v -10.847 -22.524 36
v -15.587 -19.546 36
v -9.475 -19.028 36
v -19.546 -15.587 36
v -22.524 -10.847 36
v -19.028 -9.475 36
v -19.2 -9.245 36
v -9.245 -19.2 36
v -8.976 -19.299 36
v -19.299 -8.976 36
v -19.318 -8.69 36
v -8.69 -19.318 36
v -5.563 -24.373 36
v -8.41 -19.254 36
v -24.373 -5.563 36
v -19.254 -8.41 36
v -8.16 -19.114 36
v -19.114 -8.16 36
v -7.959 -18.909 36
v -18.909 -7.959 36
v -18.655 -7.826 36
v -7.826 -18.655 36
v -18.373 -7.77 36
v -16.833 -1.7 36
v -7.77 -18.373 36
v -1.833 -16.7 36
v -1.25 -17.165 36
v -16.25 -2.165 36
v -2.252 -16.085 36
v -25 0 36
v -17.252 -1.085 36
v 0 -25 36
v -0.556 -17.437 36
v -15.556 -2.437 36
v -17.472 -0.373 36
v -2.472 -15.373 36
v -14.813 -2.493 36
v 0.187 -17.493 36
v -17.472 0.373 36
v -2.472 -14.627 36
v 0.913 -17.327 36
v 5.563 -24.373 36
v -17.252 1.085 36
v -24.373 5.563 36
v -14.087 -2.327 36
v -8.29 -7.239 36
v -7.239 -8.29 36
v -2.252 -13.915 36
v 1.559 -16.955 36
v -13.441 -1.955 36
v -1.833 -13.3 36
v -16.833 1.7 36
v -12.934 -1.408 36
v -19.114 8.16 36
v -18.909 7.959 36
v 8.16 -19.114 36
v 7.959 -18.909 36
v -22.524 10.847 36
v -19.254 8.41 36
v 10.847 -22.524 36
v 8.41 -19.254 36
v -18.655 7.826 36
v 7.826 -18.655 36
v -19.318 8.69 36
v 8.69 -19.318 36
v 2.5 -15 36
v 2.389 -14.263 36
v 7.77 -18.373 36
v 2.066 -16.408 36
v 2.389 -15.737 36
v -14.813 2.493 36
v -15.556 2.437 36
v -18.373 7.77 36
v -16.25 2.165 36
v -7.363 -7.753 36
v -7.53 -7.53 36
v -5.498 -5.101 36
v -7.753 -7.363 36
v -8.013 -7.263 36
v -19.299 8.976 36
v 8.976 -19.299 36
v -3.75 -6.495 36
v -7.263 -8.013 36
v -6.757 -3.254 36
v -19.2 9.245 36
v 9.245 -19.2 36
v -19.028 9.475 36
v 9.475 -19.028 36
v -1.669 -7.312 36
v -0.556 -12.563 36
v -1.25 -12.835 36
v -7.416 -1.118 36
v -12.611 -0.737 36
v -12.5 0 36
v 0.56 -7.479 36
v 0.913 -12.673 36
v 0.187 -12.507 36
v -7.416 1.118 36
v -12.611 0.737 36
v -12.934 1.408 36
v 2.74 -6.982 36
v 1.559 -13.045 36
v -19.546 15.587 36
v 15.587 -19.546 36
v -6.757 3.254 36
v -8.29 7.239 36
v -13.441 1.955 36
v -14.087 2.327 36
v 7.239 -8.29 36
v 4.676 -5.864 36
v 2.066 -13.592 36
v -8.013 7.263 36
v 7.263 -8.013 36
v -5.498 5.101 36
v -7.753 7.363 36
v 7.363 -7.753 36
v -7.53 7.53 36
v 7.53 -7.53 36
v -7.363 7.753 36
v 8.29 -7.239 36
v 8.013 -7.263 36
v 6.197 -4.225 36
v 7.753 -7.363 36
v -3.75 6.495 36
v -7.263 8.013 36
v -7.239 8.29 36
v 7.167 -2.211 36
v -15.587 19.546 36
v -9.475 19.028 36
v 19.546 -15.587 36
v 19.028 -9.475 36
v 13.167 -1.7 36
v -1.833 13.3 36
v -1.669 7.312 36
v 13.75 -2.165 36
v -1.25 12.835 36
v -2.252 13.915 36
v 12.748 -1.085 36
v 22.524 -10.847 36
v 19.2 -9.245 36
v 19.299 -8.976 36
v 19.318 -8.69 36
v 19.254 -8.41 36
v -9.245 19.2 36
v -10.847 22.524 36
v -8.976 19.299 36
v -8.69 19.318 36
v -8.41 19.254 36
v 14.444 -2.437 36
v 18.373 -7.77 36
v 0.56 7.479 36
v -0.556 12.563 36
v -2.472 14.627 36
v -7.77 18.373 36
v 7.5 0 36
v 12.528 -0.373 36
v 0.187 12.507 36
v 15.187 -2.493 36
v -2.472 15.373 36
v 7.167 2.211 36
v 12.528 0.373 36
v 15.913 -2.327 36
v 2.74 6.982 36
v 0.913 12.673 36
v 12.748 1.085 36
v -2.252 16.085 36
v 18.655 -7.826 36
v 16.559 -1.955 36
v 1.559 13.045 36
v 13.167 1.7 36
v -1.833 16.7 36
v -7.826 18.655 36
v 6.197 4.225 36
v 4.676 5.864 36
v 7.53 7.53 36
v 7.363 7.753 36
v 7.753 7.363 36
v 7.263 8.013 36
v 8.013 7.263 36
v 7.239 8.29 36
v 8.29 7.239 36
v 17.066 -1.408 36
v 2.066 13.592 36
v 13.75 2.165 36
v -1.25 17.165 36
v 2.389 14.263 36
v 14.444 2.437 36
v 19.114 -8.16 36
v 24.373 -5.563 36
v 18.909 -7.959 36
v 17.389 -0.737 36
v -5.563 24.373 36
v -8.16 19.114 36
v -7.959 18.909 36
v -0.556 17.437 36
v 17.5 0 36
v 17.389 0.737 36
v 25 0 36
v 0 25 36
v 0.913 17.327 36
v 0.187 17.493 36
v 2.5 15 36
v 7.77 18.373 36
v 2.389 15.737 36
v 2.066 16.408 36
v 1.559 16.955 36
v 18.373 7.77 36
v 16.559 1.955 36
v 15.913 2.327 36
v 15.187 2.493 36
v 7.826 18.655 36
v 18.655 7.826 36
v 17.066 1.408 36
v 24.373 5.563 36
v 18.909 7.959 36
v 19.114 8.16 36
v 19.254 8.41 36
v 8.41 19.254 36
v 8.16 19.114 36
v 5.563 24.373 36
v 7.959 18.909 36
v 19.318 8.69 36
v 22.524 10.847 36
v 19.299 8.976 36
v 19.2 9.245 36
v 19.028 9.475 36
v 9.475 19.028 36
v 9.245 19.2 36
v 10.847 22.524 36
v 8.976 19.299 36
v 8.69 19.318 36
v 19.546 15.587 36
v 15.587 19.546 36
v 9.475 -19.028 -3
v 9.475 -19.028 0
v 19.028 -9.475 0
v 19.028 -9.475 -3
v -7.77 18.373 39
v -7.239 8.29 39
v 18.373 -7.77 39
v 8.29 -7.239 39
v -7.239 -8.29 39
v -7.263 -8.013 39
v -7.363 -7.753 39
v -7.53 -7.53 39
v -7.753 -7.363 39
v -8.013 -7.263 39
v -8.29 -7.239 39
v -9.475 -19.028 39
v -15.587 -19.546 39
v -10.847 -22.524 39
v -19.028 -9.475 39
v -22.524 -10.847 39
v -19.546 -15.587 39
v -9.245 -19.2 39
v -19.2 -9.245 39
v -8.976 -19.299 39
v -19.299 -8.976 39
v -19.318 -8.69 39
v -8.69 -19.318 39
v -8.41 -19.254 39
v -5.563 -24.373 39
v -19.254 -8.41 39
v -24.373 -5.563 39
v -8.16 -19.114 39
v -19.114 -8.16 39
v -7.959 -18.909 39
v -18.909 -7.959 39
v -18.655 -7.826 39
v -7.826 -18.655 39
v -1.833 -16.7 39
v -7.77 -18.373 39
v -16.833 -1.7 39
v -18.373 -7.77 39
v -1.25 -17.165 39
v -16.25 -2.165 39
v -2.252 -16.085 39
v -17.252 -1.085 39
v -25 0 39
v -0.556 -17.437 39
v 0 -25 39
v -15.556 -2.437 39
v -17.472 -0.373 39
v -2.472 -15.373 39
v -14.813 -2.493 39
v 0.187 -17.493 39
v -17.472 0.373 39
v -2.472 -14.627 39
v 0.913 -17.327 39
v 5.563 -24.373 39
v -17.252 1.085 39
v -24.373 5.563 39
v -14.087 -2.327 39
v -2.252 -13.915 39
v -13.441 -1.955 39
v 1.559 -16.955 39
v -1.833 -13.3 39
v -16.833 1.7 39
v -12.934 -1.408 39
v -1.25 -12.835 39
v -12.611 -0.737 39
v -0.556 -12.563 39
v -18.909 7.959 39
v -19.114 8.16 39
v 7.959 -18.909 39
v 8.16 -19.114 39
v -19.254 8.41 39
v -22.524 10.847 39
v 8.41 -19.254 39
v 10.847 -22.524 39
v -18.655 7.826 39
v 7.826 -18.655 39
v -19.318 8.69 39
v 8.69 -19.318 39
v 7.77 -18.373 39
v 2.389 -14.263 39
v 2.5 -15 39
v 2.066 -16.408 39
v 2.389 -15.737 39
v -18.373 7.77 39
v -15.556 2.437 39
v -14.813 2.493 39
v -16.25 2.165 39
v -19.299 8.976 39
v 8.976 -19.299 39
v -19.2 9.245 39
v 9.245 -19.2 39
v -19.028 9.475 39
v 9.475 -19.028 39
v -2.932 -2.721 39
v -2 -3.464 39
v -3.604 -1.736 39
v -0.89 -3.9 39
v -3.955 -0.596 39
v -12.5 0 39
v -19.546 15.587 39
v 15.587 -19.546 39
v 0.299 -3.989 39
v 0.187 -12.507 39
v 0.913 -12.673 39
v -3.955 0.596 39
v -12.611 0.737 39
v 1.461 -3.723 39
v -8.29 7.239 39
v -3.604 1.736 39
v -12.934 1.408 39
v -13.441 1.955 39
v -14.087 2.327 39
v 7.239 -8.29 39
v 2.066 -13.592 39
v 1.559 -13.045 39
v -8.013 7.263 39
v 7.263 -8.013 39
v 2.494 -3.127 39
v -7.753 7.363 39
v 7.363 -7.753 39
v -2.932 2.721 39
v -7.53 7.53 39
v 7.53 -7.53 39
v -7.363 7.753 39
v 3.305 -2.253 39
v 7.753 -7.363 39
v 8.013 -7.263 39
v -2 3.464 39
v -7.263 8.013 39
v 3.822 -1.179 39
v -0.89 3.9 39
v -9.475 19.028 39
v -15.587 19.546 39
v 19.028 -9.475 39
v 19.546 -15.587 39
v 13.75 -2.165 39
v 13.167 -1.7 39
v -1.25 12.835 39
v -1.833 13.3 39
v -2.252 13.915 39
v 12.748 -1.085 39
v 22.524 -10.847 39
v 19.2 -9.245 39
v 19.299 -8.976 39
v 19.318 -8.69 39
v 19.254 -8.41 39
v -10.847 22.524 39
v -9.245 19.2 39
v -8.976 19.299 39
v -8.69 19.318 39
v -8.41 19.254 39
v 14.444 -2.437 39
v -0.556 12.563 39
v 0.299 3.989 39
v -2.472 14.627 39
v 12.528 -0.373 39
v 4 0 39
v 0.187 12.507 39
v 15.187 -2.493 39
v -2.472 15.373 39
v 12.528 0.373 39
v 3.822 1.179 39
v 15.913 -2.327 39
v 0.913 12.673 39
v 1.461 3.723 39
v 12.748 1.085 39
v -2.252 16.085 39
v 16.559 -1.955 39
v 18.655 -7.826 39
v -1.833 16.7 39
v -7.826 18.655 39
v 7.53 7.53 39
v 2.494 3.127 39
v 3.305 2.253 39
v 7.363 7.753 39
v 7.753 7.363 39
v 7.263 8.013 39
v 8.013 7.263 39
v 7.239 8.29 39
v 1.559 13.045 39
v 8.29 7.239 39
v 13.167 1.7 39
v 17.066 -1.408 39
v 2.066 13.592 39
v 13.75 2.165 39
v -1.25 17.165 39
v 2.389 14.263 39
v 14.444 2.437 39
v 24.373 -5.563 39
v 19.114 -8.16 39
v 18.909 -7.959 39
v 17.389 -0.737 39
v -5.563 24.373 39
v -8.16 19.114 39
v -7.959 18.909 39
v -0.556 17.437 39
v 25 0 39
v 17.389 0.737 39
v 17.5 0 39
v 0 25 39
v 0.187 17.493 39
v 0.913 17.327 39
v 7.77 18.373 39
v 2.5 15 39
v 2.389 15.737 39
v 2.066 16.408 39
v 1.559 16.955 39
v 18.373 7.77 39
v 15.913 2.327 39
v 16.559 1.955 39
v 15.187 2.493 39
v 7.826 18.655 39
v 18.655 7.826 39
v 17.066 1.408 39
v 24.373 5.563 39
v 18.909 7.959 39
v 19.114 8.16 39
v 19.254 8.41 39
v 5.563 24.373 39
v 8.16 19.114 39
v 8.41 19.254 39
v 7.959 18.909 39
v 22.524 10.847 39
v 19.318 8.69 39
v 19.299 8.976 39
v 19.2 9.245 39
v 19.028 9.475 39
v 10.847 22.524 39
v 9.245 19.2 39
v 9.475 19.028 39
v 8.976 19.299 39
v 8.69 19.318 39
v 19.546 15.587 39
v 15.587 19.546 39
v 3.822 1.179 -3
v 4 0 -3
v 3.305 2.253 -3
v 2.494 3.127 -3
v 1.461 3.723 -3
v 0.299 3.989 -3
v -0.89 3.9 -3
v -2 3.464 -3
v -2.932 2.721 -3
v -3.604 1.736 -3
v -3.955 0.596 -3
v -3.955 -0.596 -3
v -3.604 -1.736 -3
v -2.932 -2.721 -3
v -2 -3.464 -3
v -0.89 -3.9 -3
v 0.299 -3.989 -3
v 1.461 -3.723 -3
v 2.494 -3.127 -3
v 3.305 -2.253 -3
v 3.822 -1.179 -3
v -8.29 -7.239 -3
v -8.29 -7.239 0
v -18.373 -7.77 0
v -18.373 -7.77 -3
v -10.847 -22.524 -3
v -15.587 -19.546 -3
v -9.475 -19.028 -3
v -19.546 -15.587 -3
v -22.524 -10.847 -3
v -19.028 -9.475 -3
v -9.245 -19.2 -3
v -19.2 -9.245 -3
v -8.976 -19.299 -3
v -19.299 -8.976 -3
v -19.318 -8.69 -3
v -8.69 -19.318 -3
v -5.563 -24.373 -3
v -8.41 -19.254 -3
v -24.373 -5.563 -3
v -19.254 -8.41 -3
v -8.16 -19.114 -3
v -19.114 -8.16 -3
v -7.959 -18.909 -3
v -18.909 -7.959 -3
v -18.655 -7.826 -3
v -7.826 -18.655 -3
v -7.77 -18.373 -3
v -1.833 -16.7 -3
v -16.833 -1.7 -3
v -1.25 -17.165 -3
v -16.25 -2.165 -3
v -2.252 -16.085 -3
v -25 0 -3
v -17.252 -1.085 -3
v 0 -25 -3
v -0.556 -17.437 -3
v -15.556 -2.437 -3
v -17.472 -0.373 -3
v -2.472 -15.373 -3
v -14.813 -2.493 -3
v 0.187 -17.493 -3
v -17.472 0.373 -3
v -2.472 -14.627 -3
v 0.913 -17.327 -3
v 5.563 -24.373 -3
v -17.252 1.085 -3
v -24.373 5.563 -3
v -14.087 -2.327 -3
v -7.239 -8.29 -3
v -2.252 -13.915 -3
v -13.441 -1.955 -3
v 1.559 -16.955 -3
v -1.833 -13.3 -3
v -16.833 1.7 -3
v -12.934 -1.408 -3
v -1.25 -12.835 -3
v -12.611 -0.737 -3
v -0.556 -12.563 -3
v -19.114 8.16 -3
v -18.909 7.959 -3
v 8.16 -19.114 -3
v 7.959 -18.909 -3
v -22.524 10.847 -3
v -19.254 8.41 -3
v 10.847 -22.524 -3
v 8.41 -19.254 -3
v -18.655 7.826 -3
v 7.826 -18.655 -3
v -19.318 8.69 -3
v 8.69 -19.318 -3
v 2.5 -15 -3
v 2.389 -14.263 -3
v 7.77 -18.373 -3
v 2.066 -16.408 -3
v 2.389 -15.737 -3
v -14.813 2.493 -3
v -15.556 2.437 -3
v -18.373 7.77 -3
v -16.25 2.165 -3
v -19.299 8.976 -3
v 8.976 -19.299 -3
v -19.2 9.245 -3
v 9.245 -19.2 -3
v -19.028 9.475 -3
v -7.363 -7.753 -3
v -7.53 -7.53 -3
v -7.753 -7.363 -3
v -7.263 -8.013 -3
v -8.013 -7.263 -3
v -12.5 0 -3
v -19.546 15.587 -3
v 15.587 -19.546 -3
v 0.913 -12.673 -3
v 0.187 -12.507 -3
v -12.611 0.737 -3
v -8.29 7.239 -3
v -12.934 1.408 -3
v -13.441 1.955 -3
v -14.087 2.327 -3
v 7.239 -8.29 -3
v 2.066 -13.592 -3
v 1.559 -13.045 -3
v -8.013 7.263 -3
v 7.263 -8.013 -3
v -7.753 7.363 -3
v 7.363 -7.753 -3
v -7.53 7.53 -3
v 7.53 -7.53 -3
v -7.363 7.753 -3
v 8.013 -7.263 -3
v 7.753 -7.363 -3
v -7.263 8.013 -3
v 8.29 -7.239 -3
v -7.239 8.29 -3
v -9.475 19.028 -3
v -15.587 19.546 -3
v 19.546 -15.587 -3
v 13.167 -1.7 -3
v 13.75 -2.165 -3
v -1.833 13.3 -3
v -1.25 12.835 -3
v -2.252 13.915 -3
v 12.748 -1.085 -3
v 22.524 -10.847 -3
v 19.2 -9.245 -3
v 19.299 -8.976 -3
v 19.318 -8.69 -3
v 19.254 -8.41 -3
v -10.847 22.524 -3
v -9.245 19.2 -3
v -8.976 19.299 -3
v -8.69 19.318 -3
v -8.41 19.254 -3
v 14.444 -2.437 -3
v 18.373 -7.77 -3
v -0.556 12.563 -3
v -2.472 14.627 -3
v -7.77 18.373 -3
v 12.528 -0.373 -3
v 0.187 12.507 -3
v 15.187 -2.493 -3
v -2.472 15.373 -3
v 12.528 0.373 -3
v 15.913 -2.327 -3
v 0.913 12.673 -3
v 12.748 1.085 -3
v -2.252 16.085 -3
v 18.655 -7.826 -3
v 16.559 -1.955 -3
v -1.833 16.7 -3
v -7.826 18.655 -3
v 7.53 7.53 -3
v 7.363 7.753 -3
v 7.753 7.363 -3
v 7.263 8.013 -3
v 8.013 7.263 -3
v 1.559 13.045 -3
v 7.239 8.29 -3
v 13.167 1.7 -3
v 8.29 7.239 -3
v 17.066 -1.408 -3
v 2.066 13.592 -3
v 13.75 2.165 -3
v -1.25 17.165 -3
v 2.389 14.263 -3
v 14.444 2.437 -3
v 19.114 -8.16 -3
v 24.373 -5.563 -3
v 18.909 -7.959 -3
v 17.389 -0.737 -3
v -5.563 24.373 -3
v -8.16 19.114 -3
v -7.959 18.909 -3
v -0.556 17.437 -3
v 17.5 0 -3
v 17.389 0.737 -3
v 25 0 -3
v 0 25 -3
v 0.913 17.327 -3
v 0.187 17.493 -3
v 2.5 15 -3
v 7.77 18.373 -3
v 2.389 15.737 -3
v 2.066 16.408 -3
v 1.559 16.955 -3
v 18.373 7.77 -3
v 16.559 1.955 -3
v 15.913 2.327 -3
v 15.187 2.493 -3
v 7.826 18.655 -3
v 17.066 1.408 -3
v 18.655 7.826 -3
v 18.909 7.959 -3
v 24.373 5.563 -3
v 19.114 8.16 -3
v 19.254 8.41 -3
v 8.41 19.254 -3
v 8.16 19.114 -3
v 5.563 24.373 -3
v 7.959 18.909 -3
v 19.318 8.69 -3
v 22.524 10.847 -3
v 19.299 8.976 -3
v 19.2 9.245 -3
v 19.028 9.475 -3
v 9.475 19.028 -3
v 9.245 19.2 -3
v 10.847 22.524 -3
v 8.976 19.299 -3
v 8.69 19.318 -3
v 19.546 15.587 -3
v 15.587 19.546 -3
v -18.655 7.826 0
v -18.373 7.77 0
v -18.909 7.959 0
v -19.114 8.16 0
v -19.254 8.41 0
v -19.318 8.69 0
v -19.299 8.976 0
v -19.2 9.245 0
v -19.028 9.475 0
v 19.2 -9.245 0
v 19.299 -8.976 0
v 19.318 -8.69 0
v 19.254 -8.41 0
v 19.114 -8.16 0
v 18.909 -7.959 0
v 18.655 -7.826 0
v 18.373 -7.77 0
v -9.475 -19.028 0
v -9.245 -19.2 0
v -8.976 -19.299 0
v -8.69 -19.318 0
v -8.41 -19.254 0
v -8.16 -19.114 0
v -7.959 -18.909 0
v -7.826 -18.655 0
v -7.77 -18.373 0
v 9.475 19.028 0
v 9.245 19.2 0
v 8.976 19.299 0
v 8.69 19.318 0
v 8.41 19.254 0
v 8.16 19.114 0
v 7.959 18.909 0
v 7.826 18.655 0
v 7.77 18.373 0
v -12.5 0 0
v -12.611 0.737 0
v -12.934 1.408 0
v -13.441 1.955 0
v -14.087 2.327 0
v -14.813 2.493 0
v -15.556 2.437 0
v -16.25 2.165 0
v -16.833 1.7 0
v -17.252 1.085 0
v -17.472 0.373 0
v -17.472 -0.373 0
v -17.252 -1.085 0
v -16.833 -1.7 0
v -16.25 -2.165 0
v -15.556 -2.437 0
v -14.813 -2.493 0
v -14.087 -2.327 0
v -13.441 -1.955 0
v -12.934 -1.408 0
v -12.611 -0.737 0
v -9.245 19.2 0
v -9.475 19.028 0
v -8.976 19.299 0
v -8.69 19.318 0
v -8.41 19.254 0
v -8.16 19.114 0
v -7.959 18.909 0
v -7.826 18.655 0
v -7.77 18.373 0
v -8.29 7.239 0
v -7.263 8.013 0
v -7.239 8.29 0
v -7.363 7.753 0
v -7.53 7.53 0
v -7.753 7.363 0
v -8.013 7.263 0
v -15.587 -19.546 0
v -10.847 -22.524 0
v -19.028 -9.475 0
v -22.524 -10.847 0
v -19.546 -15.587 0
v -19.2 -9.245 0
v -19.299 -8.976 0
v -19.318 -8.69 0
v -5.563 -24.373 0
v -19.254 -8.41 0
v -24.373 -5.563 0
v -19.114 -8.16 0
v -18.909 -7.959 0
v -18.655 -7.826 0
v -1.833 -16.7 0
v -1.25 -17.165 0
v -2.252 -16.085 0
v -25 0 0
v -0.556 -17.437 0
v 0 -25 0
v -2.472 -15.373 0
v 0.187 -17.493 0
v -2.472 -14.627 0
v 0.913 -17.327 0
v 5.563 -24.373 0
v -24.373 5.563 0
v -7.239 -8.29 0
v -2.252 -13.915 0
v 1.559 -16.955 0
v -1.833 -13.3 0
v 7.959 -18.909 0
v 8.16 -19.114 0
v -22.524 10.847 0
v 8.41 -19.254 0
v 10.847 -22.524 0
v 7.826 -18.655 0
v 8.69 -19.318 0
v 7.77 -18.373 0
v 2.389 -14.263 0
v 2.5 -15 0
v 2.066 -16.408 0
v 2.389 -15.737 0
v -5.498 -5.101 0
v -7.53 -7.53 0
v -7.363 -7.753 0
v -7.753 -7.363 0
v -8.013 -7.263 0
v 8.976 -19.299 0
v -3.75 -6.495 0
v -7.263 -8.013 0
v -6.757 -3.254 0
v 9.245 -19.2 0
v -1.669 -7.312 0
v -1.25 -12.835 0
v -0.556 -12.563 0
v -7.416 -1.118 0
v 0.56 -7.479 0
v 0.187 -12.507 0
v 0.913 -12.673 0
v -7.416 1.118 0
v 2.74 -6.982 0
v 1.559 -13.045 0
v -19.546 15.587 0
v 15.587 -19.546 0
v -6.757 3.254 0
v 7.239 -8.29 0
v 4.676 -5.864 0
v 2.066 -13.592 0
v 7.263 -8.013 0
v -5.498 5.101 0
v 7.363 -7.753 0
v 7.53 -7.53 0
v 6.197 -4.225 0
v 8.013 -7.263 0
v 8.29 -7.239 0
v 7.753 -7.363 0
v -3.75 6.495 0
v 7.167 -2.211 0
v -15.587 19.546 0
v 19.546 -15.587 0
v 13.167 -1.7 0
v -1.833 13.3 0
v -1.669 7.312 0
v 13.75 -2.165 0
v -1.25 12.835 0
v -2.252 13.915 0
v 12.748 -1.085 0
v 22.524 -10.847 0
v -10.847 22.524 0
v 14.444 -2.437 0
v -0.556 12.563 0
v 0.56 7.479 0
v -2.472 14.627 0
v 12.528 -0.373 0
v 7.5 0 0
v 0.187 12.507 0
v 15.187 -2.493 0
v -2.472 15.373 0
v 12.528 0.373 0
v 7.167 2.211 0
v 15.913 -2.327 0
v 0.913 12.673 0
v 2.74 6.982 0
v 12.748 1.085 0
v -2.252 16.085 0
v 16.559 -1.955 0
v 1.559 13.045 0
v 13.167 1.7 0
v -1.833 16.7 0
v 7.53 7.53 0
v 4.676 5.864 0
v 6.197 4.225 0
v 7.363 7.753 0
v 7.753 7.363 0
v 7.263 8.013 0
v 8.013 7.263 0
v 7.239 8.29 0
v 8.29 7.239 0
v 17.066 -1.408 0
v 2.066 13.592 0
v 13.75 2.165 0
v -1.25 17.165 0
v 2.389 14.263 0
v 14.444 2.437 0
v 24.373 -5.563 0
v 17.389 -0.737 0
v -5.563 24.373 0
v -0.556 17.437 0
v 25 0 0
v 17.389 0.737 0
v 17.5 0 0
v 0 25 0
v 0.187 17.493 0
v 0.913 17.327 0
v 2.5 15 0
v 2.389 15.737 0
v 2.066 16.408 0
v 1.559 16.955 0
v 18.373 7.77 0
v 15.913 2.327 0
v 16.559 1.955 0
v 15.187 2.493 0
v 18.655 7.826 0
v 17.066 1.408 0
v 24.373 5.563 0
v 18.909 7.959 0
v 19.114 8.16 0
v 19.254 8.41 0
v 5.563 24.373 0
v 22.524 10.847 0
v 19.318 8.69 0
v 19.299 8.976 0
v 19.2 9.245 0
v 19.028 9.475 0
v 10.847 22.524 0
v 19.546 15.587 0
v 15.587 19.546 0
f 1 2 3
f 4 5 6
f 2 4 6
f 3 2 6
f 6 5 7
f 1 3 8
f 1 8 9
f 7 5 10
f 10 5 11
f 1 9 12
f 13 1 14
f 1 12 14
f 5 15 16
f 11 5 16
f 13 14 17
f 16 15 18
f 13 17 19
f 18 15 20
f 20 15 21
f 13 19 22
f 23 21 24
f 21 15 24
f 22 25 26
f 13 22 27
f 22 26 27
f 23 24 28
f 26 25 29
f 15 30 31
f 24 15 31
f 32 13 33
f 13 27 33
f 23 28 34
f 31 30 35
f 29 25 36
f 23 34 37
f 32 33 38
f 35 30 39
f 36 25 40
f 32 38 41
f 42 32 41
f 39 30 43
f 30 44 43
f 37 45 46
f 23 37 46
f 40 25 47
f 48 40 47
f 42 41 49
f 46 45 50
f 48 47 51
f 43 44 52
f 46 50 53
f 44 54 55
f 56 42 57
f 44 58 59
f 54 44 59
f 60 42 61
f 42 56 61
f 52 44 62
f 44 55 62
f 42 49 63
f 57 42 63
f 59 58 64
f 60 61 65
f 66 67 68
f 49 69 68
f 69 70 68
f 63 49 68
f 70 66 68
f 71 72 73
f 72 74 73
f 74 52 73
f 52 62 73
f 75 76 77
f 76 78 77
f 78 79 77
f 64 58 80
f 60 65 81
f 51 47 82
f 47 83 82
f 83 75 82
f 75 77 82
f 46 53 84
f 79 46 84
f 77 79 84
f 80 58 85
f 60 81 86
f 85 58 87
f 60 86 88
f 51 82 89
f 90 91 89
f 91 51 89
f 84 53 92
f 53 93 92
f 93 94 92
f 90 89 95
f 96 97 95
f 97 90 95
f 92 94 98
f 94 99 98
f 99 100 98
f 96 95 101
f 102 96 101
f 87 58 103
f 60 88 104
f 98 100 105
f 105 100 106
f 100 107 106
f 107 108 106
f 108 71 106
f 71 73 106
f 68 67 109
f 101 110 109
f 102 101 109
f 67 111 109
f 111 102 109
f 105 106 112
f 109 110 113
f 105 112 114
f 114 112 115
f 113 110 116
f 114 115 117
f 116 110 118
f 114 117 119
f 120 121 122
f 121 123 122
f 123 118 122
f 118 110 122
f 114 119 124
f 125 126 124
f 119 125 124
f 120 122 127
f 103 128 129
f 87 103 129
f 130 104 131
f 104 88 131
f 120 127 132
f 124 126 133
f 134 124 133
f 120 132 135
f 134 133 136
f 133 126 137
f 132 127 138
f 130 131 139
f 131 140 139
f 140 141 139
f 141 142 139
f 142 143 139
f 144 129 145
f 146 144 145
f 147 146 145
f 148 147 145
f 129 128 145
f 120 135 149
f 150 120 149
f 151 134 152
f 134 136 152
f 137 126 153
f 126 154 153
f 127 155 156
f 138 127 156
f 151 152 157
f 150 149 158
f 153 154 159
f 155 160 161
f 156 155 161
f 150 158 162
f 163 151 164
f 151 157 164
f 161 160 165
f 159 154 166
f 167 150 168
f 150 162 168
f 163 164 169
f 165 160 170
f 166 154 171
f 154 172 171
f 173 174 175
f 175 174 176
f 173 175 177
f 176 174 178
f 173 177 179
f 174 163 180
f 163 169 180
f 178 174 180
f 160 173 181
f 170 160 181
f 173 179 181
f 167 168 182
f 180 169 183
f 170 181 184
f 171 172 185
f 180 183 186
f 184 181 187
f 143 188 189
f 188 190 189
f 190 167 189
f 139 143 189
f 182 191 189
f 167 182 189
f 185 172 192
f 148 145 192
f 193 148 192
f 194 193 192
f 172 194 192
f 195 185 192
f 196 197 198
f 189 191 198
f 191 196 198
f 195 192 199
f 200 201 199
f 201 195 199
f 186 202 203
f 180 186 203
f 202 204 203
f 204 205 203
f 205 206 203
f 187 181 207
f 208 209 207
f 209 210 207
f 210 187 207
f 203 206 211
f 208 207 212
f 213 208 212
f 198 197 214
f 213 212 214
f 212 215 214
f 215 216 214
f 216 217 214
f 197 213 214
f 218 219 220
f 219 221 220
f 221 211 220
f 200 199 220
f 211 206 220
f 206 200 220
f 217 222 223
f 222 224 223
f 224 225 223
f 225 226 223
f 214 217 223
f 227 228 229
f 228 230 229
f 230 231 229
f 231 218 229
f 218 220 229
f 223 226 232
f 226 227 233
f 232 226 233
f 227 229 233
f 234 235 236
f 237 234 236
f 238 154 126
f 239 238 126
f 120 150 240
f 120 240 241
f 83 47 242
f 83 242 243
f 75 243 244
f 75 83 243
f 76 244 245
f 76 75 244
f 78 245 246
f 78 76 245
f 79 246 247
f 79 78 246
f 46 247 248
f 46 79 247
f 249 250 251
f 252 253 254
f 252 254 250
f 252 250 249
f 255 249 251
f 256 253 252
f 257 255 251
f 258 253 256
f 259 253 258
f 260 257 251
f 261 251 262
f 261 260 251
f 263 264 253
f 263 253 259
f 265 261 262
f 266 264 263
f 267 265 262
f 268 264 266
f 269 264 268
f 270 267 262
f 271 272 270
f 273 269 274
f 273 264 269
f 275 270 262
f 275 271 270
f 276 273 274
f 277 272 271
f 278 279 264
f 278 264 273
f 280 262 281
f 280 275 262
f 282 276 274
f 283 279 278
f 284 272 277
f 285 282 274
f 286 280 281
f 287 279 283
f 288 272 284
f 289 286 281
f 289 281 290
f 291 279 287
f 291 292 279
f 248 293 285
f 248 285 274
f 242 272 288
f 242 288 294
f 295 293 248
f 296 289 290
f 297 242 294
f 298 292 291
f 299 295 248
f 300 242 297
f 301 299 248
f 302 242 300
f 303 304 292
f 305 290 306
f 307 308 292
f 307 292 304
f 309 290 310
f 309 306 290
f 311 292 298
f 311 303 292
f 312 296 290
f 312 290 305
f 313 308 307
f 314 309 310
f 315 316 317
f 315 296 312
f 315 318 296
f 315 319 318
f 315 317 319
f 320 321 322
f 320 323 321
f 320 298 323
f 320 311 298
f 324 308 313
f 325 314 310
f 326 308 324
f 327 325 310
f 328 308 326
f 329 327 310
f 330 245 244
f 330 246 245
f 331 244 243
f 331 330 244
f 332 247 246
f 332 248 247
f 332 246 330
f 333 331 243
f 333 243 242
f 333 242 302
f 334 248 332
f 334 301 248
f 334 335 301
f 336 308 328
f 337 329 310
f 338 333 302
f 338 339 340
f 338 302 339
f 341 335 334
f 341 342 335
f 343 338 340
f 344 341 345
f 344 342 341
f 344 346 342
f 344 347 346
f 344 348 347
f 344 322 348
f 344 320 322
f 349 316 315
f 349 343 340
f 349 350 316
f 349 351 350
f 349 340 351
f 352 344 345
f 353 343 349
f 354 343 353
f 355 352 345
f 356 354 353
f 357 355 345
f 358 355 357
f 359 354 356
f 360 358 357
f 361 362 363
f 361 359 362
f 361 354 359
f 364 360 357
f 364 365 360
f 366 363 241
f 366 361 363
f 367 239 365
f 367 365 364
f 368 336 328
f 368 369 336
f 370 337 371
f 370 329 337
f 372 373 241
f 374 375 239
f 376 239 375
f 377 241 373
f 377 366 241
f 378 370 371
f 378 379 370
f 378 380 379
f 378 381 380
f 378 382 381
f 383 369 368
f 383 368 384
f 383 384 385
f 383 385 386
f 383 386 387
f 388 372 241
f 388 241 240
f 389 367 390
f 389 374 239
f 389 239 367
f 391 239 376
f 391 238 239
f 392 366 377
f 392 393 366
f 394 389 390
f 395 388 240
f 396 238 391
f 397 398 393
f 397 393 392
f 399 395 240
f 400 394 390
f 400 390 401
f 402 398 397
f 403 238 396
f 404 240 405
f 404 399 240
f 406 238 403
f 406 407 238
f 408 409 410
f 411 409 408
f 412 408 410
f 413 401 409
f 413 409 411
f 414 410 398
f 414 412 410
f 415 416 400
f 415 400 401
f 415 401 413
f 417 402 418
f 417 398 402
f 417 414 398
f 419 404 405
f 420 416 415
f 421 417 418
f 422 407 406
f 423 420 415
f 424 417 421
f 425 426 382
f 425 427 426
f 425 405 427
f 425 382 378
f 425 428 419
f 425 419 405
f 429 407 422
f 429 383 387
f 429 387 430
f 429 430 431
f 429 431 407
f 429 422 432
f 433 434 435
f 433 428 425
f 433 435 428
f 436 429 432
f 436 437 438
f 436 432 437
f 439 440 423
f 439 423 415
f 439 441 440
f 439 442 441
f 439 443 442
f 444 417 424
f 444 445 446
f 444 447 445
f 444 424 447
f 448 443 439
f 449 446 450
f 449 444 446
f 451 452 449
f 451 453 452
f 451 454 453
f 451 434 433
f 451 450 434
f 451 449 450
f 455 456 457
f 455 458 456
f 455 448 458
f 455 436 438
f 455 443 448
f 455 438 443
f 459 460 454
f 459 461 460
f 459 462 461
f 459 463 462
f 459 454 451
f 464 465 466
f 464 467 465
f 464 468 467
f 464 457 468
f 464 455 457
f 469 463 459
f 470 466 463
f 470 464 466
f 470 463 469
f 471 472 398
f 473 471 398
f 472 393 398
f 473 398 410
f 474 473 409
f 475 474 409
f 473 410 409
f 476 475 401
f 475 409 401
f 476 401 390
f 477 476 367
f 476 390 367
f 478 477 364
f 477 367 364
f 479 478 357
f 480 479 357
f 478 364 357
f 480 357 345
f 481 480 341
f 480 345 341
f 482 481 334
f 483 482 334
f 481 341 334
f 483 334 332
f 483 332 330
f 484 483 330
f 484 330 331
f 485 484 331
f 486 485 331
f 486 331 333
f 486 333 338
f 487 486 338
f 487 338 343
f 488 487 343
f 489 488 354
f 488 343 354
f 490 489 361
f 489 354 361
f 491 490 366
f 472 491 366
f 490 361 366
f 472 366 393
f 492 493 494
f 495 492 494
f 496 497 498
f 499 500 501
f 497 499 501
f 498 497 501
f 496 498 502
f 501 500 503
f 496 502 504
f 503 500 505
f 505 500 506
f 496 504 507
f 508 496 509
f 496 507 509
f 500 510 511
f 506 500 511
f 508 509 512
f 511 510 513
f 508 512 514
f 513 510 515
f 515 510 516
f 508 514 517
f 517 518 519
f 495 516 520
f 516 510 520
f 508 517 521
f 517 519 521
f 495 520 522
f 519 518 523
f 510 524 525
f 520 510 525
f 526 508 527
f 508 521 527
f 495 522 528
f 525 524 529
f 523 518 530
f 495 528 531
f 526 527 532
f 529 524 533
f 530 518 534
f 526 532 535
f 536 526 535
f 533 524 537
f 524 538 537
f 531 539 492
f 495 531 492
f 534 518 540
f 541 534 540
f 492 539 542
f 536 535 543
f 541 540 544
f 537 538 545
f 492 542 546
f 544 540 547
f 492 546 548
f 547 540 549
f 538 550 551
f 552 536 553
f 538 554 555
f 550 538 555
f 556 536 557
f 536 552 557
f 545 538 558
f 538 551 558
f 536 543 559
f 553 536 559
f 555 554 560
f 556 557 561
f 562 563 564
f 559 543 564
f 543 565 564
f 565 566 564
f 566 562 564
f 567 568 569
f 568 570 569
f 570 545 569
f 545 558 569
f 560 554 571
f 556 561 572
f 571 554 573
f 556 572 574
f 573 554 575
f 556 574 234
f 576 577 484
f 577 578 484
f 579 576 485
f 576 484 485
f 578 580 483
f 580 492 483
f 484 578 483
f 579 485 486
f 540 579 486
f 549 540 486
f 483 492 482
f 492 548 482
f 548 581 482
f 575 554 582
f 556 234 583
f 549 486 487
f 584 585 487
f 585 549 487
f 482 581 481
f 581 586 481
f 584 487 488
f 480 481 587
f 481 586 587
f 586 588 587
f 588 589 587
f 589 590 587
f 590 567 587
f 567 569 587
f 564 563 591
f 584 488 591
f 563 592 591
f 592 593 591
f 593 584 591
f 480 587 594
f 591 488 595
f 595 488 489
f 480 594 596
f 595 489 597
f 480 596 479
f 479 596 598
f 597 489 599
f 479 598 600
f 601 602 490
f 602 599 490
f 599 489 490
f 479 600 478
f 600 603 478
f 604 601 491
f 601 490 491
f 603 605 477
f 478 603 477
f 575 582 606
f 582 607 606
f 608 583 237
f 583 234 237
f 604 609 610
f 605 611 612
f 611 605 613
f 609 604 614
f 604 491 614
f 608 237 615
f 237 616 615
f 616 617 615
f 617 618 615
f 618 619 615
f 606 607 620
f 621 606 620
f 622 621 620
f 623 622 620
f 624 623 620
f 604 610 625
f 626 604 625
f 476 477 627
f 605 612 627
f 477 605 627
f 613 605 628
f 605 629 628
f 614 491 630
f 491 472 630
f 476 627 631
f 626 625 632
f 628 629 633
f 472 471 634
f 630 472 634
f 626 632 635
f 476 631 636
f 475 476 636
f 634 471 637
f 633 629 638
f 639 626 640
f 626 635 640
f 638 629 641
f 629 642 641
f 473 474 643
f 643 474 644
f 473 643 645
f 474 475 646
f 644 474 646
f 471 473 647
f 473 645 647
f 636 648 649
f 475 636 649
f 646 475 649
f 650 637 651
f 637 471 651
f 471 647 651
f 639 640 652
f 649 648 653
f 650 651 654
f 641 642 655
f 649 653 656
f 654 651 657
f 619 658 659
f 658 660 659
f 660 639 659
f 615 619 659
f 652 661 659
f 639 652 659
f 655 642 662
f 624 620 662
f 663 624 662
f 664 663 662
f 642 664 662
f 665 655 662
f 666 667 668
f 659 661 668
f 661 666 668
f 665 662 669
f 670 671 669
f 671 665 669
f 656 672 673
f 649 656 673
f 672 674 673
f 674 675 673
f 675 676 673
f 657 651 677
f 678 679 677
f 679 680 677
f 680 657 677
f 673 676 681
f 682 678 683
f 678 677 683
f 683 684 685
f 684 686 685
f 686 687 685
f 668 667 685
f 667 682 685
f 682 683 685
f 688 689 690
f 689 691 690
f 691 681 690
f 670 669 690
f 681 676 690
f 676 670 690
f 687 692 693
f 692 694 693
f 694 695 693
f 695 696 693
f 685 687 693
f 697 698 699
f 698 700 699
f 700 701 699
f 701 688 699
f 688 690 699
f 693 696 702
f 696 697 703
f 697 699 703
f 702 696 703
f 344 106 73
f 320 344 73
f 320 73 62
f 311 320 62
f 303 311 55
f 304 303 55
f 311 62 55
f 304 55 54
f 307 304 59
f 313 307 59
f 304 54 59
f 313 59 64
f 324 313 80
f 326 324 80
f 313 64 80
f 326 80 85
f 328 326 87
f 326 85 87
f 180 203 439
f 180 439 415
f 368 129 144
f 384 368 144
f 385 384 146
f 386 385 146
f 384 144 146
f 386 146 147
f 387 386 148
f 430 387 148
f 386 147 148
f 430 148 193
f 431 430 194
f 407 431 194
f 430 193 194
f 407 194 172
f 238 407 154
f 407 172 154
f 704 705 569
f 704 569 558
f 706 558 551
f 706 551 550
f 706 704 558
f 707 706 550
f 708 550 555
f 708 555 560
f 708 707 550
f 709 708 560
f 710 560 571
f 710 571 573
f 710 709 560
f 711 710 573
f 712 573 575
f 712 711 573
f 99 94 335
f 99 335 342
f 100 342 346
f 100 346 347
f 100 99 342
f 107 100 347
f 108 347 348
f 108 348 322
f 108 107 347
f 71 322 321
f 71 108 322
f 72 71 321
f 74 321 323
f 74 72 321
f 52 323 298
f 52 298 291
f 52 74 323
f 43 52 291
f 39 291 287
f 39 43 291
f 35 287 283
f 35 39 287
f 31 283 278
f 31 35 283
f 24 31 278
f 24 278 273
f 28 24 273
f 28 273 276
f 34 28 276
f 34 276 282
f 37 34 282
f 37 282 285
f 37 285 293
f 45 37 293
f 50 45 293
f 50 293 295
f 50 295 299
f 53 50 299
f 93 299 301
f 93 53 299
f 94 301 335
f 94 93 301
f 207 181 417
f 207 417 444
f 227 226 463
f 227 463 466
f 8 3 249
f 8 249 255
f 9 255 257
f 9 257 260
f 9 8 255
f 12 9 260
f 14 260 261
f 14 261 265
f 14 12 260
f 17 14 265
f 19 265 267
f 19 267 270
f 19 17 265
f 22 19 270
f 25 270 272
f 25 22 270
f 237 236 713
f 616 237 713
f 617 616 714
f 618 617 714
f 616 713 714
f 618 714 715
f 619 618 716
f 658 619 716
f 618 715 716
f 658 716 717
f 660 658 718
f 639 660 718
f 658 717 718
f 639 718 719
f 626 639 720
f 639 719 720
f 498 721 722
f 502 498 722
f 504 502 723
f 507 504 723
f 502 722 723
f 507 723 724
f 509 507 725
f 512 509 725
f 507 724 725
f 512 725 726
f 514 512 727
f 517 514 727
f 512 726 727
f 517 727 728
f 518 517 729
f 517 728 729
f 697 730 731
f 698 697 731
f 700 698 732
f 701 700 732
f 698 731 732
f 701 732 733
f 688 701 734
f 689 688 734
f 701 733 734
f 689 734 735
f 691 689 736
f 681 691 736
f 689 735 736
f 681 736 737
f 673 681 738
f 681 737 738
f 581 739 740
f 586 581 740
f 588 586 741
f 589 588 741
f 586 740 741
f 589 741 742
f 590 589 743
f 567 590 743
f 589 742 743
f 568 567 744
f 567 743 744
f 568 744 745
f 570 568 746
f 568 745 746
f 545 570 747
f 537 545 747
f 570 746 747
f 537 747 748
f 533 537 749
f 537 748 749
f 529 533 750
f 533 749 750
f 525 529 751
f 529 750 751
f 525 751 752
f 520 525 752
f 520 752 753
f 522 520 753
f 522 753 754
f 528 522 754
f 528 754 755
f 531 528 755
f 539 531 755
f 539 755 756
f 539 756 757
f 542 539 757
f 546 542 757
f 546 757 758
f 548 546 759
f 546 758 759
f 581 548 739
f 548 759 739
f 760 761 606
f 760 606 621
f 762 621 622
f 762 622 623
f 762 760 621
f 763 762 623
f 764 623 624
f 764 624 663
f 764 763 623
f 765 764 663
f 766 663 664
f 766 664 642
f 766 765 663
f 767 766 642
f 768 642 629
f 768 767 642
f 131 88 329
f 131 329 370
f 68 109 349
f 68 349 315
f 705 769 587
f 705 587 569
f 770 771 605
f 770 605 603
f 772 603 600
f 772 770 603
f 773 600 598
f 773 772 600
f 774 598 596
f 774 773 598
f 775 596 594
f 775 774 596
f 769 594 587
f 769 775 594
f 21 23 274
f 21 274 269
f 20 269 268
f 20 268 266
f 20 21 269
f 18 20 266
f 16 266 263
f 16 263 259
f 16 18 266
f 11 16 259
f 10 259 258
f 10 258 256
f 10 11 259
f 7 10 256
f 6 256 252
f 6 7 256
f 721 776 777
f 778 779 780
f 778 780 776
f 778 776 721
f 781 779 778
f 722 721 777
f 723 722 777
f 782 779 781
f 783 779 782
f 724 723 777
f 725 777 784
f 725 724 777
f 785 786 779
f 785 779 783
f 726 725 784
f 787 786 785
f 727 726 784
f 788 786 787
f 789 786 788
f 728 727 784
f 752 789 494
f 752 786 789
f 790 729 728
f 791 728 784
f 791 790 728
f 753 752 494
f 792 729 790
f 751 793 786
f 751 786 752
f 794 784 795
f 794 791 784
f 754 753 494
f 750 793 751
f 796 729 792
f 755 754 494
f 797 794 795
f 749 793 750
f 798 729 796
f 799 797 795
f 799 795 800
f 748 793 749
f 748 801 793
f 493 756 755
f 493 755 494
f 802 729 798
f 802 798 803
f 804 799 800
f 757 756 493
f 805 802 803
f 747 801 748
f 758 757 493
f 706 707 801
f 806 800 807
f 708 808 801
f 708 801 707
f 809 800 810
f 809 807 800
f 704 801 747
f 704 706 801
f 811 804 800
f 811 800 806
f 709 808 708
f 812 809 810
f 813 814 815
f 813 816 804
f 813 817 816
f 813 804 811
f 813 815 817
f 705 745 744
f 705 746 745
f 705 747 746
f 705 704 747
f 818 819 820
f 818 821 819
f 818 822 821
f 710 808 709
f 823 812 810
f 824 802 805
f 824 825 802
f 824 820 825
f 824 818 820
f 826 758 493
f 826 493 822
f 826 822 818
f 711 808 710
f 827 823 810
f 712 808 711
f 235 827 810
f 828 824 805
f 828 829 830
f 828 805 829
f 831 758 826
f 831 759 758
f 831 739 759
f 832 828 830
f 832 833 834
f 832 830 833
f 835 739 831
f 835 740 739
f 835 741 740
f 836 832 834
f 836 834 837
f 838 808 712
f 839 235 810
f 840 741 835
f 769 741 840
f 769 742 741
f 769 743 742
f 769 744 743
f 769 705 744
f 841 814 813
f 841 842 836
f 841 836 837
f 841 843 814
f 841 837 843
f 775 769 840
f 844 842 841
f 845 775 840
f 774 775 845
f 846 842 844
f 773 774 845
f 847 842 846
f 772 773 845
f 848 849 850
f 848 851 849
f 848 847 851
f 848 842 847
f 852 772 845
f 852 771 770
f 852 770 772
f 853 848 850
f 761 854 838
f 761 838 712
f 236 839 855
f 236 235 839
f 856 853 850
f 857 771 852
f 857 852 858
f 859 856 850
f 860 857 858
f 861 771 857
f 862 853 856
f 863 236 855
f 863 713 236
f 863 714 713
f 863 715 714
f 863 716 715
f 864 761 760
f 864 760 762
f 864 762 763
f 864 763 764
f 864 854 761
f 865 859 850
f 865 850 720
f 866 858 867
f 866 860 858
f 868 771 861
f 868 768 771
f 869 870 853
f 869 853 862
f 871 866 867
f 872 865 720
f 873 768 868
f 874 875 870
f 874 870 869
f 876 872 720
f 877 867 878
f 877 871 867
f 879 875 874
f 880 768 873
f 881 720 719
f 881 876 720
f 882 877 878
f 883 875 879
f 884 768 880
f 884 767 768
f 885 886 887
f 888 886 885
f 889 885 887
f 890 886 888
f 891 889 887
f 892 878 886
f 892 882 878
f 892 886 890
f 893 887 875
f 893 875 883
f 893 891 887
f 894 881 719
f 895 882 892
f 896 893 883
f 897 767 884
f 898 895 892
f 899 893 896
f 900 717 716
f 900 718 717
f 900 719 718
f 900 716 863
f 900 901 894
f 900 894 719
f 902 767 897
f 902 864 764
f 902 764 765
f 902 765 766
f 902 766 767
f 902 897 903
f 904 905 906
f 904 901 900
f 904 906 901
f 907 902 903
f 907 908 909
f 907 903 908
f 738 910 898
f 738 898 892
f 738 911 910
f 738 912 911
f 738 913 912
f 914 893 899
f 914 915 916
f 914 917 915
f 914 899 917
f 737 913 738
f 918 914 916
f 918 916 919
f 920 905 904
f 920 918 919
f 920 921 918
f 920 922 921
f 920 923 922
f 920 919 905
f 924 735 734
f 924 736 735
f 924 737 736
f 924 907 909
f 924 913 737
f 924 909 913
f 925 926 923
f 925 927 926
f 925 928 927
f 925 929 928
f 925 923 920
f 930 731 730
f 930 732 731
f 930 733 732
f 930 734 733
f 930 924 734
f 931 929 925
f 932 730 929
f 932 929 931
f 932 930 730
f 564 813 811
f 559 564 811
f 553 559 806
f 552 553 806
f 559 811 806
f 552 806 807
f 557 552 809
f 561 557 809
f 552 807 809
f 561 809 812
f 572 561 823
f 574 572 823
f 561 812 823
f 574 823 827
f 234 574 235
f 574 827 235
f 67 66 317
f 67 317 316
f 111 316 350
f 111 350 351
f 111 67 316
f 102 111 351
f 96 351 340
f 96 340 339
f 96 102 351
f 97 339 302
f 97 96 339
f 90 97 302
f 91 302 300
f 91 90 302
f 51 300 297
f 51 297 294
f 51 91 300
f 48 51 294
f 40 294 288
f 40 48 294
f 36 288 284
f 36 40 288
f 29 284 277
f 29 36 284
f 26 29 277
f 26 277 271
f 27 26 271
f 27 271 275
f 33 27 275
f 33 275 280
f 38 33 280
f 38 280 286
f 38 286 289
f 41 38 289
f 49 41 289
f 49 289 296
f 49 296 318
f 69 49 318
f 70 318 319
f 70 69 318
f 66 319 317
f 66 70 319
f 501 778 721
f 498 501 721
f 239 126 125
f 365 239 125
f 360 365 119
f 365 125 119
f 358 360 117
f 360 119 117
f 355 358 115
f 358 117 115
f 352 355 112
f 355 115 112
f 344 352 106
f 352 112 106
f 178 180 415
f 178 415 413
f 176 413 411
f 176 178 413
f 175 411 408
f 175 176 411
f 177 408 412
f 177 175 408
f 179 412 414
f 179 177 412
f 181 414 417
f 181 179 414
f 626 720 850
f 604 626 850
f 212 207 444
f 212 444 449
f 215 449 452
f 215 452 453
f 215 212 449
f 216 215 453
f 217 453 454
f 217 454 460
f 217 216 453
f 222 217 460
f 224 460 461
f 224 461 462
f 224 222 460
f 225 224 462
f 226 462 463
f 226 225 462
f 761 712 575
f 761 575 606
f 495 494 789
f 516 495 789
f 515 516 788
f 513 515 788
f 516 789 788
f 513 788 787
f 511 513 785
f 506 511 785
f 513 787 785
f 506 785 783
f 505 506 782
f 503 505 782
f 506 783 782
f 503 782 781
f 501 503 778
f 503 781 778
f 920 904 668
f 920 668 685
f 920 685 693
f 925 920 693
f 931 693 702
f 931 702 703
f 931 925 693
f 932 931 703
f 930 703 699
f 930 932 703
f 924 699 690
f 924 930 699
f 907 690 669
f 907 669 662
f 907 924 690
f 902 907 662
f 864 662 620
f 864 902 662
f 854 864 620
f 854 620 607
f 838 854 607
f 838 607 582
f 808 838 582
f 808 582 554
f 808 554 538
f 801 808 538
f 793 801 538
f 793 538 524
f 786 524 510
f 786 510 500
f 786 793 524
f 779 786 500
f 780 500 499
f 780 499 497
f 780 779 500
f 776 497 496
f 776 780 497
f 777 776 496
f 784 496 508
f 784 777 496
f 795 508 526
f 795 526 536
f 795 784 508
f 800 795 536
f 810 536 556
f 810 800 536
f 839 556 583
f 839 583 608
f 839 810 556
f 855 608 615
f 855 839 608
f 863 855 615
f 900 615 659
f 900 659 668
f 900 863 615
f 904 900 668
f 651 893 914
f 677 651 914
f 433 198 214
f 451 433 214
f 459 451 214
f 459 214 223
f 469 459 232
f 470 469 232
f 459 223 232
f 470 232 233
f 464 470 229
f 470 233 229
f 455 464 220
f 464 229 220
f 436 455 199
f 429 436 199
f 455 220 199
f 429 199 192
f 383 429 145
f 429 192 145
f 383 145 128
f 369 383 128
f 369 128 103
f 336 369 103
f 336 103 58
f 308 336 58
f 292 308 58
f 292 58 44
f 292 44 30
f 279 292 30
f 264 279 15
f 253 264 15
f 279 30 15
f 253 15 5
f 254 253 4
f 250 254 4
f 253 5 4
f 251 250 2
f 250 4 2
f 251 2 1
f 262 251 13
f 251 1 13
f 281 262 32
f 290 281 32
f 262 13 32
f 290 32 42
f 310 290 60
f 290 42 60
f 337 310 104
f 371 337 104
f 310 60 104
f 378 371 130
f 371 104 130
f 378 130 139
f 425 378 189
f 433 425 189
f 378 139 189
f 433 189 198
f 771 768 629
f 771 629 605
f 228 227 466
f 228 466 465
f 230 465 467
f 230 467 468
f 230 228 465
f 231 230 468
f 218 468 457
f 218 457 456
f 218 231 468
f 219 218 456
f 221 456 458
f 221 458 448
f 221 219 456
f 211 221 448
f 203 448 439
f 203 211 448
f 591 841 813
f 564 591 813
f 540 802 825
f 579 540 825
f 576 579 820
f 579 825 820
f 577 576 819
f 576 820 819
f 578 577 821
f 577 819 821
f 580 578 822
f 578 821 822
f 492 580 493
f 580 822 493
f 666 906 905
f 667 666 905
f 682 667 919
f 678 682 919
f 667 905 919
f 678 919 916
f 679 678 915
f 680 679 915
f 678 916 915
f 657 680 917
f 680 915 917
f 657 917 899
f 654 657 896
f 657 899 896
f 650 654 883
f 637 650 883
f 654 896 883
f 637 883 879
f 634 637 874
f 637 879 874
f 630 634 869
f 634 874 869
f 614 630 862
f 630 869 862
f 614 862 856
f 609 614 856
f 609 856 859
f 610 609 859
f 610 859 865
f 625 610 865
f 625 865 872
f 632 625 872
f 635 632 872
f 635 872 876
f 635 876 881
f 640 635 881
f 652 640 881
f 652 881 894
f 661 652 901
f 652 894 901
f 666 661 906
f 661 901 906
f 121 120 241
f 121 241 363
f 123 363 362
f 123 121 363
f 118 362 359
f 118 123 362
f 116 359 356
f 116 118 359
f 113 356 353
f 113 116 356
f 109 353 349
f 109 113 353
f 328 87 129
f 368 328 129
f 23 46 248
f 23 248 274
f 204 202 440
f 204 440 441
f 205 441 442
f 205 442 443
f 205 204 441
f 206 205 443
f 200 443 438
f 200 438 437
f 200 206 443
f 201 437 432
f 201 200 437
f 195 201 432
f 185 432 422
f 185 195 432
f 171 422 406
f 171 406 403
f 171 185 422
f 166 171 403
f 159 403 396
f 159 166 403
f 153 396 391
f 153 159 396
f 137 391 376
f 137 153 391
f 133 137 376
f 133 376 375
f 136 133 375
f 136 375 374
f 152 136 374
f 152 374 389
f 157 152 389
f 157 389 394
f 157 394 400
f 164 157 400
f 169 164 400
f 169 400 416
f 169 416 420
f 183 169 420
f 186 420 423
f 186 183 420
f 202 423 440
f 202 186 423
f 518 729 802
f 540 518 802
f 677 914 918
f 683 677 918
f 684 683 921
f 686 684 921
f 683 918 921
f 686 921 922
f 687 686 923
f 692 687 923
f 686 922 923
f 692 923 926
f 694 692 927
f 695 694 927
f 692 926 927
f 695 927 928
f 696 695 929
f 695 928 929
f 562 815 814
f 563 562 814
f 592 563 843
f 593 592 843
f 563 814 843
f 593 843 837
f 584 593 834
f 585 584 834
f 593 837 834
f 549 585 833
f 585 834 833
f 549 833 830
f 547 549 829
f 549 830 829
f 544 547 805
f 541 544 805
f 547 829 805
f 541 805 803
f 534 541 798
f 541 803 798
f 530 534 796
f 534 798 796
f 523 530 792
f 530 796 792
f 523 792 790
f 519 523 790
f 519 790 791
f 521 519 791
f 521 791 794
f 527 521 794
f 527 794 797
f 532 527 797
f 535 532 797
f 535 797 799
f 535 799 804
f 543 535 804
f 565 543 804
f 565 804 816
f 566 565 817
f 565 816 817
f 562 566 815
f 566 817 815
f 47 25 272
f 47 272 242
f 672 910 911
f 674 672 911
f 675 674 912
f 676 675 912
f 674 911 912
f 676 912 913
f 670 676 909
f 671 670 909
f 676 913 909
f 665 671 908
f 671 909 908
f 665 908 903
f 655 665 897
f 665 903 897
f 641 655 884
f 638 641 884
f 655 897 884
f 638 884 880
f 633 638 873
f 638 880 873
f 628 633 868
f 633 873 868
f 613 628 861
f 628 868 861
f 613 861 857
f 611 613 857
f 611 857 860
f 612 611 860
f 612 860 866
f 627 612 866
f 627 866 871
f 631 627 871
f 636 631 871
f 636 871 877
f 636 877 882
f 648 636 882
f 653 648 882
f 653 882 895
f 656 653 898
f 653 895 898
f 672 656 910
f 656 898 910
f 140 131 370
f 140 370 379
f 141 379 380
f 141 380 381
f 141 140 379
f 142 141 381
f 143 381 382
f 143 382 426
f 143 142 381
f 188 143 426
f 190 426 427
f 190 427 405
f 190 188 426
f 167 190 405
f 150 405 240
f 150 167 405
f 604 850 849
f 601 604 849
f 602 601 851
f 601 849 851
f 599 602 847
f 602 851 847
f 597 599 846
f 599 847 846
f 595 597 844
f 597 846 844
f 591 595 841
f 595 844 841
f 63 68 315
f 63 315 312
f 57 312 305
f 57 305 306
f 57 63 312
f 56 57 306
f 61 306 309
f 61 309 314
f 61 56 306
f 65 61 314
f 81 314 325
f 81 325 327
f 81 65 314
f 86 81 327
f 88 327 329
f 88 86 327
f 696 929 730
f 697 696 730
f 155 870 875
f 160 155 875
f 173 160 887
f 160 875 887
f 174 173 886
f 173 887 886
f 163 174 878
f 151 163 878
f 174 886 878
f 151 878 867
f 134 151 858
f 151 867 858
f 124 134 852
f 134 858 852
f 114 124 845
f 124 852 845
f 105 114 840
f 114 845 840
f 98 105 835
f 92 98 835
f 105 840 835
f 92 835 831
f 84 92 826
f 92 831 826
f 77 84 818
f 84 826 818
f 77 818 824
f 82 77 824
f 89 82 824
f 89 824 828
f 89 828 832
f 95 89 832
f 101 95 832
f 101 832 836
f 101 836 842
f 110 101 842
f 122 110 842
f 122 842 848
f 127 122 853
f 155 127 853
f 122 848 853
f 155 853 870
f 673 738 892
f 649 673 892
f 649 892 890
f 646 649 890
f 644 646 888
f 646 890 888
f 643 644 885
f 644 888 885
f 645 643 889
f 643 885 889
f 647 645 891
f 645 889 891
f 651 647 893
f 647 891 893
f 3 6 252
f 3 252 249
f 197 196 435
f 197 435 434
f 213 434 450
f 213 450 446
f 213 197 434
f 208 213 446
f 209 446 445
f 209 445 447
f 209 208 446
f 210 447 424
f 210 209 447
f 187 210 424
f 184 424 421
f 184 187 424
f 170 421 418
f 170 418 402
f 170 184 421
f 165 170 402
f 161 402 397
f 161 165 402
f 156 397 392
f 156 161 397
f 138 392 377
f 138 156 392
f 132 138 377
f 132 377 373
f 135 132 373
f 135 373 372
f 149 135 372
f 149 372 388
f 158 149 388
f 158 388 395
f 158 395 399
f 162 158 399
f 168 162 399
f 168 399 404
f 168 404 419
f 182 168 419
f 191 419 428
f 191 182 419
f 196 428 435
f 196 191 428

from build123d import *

# Parameters (mm, degrees)
CROQUIS1_R              = 7.5
CROQUIS1_R_2            = 4
SALIENTE_EXTRUIR1_DEPTH = 36
CROQUIS2_R              = 25
CROQUIS2_R_2            = 4
CROQUIS2_R_3            = 2.5
SALIENTE_EXTRUIR2_DEPTH = 3


with BuildPart() as part:
    # Croquis1 → Saliente-Extruir1 (new body)
    with BuildSketch(Plane.XY):
        Circle(CROQUIS1_R)
        Circle(CROQUIS1_R_2, mode=Mode.SUBTRACT)
    extrude(amount=SALIENTE_EXTRUIR1_DEPTH)

    # Croquis2 → Saliente-Extruir2 (add)
    with BuildSketch(Plane.XY.offset(36)):
        Circle(CROQUIS2_R)
        Circle(CROQUIS2_R_2, mode=Mode.SUBTRACT)
        with Locations((0, 15)):
            Circle(CROQUIS2_R_3, mode=Mode.SUBTRACT)
        with Locations((15, 0)):
            Circle(CROQUIS2_R_3, mode=Mode.SUBTRACT)
        with Locations((0, -15)):
            Circle(CROQUIS2_R_3, mode=Mode.SUBTRACT)
        with Locations((-15, 0)):
            Circle(CROQUIS2_R_3, mode=Mode.SUBTRACT)
        with BuildLine():
            Line((-19.027844597, 9.475344501), (-9.475344501, 19.027844597))
            ThreePointArc((-9.475344501, 19.027844597), (-8.409973952, 19.254358227), (-7.76961989, 18.373296649))
            Line((-7.76961989, 18.373296649), (-7.23892544, 8.290102103))
            ThreePointArc((-7.23892544, 8.290102103), (-7.530436489, 7.530436489), (-8.290102103, 7.23892544))
            Line((-8.290102103, 7.23892544), (-18.373296649, 7.76961989))
            ThreePointArc((-18.373296649, 7.76961989), (-19.254358227, 8.409973952), (-19.027844597, 9.475344501))
        make_face(mode=Mode.SUBTRACT)
        with BuildLine():
            Line((7.76961989, 18.373296649), (7.23892544, 8.290102103))
            ThreePointArc((7.23892544, 8.290102103), (7.530436489, 7.530436489), (8.290102103, 7.23892544))
            Line((8.290102103, 7.23892544), (18.373296649, 7.76961989))
            ThreePointArc((18.373296649, 7.76961989), (19.254358227, 8.409973952), (19.027844597, 9.475344501))
            Line((19.027844597, 9.475344501), (9.475344501, 19.027844597))
            ThreePointArc((9.475344501, 19.027844597), (8.409973952, 19.254358227), (7.76961989, 18.373296649))
        make_face(mode=Mode.SUBTRACT)
        with BuildLine():
            Line((18.373296649, -7.76961989), (8.290102103, -7.23892544))
            ThreePointArc((8.290102103, -7.23892544), (7.530436489, -7.530436489), (7.23892544, -8.290102103))
            Line((7.23892544, -8.290102103), (7.76961989, -18.373296649))
            ThreePointArc((7.76961989, -18.373296649), (8.409973952, -19.254358227), (9.475344501, -19.027844597))
            Line((9.475344501, -19.027844597), (19.027844597, -9.475344501))
            ThreePointArc((19.027844597, -9.475344501), (19.254358227, -8.409973952), (18.373296649, -7.76961989))
        make_face(mode=Mode.SUBTRACT)
        with BuildLine():
            Line((-7.76961989, -18.373296649), (-7.23892544, -8.290102103))
            ThreePointArc((-7.23892544, -8.290102103), (-7.530436489, -7.530436489), (-8.290102103, -7.23892544))
            Line((-8.290102103, -7.23892544), (-18.373296649, -7.76961989))
            ThreePointArc((-18.373296649, -7.76961989), (-19.254358227, -8.409973952), (-19.027844597, -9.475344501))
            Line((-19.027844597, -9.475344501), (-9.475344501, -19.027844597))
            ThreePointArc((-9.475344501, -19.027844597), (-8.409973952, -19.254358227), (-7.76961989, -18.373296649))
        make_face(mode=Mode.SUBTRACT)
    saliente_extruir2 = extrude(amount=SALIENTE_EXTRUIR2_DEPTH)

    # Simetría1: Saliente-Extruir2 across plane
    add(saliente_extruir2.mirror(Plane(origin=(0, 0, 18), x_dir=(1, 0, 0), z_dir=(0, 0, -1))))


solid = part.part
